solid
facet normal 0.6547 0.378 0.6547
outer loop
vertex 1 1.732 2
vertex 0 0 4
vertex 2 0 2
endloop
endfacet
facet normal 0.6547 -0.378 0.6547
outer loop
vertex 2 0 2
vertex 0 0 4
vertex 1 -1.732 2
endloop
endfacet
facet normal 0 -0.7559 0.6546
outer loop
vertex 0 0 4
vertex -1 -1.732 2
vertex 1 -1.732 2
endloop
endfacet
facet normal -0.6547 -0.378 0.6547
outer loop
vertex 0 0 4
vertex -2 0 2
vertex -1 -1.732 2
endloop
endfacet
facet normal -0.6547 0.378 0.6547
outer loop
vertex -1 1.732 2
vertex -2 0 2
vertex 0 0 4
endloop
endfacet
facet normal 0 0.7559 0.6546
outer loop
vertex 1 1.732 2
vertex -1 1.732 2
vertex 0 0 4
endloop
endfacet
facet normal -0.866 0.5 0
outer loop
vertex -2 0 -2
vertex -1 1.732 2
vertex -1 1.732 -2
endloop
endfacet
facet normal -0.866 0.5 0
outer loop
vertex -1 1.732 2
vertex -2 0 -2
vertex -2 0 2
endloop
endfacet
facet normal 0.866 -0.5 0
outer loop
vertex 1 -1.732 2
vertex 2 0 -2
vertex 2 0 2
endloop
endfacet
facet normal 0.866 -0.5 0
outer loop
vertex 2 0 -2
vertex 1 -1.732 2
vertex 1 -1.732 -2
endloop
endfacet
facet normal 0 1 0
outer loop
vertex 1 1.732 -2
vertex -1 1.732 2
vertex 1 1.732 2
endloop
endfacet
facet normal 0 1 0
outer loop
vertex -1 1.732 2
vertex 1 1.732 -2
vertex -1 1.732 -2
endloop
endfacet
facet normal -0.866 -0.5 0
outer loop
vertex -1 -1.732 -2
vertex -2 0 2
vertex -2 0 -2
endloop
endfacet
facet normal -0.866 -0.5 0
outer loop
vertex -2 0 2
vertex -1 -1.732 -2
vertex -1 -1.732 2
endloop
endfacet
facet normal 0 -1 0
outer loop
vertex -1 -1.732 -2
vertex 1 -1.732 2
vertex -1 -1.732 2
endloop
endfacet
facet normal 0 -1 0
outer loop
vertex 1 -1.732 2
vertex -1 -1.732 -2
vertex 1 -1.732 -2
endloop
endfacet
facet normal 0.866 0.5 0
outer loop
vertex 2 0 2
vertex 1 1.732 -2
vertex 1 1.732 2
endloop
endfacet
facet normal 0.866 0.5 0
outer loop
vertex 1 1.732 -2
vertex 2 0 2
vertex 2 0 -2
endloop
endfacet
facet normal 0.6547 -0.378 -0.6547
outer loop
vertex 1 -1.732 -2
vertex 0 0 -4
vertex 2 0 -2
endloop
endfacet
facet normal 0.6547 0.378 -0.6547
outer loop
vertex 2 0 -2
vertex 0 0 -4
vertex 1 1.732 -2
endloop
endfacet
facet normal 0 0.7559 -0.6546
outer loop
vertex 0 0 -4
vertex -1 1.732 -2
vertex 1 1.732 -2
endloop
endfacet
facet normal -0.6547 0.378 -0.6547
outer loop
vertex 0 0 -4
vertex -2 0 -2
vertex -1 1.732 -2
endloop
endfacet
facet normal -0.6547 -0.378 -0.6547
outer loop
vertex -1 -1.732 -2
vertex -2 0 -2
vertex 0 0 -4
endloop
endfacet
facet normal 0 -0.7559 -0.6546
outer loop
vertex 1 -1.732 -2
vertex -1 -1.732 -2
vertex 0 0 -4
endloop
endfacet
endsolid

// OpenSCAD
prism_sides=6;
base_radius=1;
prism_height=2;
tips_height=1;
prism_twist=0;
prism_color=[0,0.5,1];
// Detail of curved surfaces: 1 face per corner
$fa=1;

module regular_polygon(order=4, r=1){
  angles=[ for (i = [0:order-1]) i*(360/order) ];
  coords=[ for (th=angles) [r*cos(th), r*sin(th)] ];
  polygon(coords);
}

module prism(fake_blur=false) {
  color(prism_color)
  render(convexity=10){
    // Top tip
    rotate([0,0,-prism_twist])
    translate([0,0,prism_height/2])
    linear_extrude(height=tips_height,center=false,convexity=0,twist=prism_twist*(tips_height/prism_height),slices=100,scale=0)
    regular_polygon(order=prism_sides, r=base_radius);

    // Prism
    if (prism_height > 0){
      linear_extrude(height=prism_height,center=true,convexity=0,twist=prism_twist,slices=100,scale=1)
      regular_polygon(order=prism_sides, r=base_radius);
    }

    // Bottom tip
    translate([0,0,-prism_height/2]) rotate([180,0,0])
    linear_extrude(height=tips_height,center=false,convexity=0,twist=prism_twist*(tips_height/prism_height),slices=100,scale=0)
    regular_polygon(order=prism_sides, r=base_radius);
  }
  
  // Extremely fake blur
  if (fake_blur==true) {
    for(index = [1:1:10]) {
      color(prism_color, alpha=0.040-index/1000) scale([index/10+1,index/10+1,index/10+1]) prism(fake_blur=false);
    }
  }
}

prism(fake_blur=true);
